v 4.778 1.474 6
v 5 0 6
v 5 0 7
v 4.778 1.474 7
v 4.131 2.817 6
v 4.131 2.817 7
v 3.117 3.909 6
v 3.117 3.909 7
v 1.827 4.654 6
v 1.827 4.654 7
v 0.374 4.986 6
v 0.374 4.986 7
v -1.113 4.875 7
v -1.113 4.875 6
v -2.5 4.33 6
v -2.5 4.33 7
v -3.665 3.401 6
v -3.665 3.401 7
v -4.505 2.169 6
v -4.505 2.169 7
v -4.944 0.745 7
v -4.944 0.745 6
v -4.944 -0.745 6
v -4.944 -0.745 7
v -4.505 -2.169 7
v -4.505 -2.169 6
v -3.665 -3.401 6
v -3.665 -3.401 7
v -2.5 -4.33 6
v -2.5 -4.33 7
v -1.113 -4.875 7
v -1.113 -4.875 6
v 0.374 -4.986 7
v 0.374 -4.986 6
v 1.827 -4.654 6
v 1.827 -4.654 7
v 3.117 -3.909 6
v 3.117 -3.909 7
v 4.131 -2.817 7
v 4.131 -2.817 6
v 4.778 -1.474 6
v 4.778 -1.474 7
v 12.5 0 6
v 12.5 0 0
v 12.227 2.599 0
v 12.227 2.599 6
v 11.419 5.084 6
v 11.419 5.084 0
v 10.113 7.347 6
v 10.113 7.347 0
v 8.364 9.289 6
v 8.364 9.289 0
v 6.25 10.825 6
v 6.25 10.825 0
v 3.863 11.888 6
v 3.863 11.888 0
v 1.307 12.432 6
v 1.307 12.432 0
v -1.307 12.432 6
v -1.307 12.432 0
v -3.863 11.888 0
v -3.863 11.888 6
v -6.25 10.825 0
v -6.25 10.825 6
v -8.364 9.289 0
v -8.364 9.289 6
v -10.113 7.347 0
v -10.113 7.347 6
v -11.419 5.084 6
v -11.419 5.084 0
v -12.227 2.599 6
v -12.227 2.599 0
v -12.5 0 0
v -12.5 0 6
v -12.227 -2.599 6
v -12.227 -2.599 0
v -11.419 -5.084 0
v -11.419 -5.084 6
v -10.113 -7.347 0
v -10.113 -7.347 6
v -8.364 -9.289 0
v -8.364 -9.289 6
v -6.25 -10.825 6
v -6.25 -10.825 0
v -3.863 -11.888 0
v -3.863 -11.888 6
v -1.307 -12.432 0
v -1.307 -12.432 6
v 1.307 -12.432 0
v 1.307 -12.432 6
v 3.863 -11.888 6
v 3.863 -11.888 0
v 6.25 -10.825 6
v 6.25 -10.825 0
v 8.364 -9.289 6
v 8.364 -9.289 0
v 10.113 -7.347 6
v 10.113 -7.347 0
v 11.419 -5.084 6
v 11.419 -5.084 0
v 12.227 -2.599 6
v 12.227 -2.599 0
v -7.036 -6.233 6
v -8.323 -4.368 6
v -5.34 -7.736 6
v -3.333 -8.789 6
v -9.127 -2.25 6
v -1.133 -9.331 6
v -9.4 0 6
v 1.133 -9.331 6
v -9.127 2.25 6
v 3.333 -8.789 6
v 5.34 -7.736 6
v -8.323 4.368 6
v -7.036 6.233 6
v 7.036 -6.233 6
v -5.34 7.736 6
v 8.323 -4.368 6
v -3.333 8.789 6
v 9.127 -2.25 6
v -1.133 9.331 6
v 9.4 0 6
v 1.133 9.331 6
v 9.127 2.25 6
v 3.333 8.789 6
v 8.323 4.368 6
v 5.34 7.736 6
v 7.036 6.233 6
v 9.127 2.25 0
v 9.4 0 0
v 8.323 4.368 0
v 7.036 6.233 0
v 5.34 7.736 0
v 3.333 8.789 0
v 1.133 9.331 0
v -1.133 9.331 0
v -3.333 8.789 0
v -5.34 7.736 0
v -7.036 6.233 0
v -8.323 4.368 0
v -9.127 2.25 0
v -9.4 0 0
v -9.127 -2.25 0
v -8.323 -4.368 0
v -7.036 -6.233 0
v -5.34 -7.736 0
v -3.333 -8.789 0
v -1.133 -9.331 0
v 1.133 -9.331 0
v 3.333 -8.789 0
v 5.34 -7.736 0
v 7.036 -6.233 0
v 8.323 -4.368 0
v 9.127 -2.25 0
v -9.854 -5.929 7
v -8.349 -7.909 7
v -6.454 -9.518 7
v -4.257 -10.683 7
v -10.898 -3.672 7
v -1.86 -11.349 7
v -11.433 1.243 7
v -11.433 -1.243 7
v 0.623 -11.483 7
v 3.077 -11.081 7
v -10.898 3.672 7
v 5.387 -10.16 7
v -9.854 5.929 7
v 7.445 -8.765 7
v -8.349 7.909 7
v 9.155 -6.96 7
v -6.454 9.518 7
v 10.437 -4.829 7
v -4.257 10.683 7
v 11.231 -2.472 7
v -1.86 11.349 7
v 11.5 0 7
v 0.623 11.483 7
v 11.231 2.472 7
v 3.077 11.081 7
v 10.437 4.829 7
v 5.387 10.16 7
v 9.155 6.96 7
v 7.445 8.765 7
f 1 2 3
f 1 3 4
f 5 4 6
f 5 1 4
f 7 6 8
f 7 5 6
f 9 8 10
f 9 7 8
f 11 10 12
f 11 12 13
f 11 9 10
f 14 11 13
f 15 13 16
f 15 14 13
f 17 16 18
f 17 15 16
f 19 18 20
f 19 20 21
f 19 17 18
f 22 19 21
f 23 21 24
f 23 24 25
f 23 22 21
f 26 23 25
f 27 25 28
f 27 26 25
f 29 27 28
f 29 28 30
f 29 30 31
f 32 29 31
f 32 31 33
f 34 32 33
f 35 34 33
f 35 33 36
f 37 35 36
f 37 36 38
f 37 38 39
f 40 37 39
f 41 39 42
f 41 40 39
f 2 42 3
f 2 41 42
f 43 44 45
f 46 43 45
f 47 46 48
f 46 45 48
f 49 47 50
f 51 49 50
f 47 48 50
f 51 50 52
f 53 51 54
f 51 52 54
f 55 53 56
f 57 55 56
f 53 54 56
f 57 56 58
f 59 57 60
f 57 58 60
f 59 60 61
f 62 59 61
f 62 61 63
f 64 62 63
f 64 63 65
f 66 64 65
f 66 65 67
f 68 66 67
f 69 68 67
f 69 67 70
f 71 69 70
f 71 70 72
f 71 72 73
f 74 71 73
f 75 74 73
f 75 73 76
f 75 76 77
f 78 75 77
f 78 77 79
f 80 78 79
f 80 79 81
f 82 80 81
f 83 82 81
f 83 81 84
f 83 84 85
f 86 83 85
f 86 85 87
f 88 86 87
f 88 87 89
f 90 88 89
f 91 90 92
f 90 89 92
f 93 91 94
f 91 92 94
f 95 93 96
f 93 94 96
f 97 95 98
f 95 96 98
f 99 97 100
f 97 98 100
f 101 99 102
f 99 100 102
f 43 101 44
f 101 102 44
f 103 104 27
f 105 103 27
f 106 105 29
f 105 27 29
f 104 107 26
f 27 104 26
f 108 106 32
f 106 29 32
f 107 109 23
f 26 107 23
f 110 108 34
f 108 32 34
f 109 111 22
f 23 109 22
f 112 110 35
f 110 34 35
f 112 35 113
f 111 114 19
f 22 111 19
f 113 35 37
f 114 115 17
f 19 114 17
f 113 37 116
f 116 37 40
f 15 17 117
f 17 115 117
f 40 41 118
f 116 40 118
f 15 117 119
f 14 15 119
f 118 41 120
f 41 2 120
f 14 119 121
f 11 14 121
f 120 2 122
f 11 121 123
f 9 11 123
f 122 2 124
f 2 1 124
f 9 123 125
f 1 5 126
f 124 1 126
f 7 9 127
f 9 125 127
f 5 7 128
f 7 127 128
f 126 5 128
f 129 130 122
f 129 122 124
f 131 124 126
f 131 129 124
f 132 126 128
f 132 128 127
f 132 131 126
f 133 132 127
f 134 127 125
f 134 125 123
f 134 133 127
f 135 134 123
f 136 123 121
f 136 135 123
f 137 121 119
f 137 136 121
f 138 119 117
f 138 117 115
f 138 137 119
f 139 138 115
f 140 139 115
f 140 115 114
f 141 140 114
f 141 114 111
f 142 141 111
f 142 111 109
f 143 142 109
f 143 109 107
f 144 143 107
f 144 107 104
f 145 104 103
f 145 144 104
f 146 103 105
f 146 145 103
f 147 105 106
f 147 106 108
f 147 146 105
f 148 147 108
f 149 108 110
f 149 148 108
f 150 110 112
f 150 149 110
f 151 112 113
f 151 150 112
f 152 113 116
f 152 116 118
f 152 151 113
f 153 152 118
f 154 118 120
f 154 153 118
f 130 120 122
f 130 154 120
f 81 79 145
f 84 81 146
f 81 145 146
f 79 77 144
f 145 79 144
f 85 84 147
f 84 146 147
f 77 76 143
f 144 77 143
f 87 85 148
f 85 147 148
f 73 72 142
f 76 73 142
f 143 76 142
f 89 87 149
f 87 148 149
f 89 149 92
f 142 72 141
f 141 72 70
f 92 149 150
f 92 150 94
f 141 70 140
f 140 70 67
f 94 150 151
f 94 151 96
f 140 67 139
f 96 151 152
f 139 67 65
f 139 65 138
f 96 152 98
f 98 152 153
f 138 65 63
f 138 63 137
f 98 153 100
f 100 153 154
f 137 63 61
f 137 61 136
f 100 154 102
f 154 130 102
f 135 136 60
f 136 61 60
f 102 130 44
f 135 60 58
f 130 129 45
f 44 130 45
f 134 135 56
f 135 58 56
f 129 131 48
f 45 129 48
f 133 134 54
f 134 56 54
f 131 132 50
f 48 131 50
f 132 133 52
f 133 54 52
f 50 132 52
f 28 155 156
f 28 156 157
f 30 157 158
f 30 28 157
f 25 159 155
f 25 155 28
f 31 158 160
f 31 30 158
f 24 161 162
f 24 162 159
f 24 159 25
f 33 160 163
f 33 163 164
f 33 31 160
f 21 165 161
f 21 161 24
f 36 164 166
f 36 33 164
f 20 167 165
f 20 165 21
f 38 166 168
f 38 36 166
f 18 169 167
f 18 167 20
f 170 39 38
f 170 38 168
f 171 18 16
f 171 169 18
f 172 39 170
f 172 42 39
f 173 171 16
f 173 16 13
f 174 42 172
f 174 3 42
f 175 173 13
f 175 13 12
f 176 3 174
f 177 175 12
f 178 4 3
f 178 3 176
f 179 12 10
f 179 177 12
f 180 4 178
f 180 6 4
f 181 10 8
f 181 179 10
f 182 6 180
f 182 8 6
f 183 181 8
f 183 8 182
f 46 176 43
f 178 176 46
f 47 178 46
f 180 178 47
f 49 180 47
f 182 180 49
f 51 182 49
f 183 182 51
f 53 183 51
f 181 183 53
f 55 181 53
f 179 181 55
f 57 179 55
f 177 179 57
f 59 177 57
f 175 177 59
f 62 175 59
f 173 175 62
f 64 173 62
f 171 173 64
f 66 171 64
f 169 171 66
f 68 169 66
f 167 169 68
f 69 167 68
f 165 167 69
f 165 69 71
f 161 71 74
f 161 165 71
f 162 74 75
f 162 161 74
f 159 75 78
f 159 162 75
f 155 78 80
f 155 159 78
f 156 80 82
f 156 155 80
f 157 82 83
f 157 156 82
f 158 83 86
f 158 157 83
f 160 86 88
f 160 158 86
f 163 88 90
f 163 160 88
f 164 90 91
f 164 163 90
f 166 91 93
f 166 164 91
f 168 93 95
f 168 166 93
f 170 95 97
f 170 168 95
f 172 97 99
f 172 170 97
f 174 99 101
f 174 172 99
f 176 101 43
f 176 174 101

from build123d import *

# Parameters (mm, degrees)
SKETCH_1_R      = 12.5
SKETCH_1_R_2    = 9.4
EXTRUDE_1_DEPTH = 6
SKETCH_2_R      = 12.5
SKETCH_2_R_2    = 5
EXTRUDE_2_DEPTH = 1
CHAMFER_1_SIZE  = 1


with BuildPart() as part:
    # 草图1 → 凸台-拉伸1 (new body)
    with BuildSketch(Plane.XY):
        Circle(SKETCH_1_R)
        Circle(SKETCH_1_R_2, mode=Mode.SUBTRACT)
    extrude(amount=EXTRUDE_1_DEPTH)

    # 草图2 → 凸台-拉伸2 (add)
    with BuildSketch(Plane.XY.offset(6)):
        Circle(SKETCH_2_R)
        Circle(SKETCH_2_R_2, mode=Mode.SUBTRACT)
    extrude(amount=EXTRUDE_2_DEPTH)

    # 倒角1
    chamfer_1_edges = [part.edges().sort_by_distance(p)[0] for p in [
        (-12.5, 0, 7),
    ]]
    chamfer(chamfer_1_edges, length=CHAMFER_1_SIZE)


solid = part.part
